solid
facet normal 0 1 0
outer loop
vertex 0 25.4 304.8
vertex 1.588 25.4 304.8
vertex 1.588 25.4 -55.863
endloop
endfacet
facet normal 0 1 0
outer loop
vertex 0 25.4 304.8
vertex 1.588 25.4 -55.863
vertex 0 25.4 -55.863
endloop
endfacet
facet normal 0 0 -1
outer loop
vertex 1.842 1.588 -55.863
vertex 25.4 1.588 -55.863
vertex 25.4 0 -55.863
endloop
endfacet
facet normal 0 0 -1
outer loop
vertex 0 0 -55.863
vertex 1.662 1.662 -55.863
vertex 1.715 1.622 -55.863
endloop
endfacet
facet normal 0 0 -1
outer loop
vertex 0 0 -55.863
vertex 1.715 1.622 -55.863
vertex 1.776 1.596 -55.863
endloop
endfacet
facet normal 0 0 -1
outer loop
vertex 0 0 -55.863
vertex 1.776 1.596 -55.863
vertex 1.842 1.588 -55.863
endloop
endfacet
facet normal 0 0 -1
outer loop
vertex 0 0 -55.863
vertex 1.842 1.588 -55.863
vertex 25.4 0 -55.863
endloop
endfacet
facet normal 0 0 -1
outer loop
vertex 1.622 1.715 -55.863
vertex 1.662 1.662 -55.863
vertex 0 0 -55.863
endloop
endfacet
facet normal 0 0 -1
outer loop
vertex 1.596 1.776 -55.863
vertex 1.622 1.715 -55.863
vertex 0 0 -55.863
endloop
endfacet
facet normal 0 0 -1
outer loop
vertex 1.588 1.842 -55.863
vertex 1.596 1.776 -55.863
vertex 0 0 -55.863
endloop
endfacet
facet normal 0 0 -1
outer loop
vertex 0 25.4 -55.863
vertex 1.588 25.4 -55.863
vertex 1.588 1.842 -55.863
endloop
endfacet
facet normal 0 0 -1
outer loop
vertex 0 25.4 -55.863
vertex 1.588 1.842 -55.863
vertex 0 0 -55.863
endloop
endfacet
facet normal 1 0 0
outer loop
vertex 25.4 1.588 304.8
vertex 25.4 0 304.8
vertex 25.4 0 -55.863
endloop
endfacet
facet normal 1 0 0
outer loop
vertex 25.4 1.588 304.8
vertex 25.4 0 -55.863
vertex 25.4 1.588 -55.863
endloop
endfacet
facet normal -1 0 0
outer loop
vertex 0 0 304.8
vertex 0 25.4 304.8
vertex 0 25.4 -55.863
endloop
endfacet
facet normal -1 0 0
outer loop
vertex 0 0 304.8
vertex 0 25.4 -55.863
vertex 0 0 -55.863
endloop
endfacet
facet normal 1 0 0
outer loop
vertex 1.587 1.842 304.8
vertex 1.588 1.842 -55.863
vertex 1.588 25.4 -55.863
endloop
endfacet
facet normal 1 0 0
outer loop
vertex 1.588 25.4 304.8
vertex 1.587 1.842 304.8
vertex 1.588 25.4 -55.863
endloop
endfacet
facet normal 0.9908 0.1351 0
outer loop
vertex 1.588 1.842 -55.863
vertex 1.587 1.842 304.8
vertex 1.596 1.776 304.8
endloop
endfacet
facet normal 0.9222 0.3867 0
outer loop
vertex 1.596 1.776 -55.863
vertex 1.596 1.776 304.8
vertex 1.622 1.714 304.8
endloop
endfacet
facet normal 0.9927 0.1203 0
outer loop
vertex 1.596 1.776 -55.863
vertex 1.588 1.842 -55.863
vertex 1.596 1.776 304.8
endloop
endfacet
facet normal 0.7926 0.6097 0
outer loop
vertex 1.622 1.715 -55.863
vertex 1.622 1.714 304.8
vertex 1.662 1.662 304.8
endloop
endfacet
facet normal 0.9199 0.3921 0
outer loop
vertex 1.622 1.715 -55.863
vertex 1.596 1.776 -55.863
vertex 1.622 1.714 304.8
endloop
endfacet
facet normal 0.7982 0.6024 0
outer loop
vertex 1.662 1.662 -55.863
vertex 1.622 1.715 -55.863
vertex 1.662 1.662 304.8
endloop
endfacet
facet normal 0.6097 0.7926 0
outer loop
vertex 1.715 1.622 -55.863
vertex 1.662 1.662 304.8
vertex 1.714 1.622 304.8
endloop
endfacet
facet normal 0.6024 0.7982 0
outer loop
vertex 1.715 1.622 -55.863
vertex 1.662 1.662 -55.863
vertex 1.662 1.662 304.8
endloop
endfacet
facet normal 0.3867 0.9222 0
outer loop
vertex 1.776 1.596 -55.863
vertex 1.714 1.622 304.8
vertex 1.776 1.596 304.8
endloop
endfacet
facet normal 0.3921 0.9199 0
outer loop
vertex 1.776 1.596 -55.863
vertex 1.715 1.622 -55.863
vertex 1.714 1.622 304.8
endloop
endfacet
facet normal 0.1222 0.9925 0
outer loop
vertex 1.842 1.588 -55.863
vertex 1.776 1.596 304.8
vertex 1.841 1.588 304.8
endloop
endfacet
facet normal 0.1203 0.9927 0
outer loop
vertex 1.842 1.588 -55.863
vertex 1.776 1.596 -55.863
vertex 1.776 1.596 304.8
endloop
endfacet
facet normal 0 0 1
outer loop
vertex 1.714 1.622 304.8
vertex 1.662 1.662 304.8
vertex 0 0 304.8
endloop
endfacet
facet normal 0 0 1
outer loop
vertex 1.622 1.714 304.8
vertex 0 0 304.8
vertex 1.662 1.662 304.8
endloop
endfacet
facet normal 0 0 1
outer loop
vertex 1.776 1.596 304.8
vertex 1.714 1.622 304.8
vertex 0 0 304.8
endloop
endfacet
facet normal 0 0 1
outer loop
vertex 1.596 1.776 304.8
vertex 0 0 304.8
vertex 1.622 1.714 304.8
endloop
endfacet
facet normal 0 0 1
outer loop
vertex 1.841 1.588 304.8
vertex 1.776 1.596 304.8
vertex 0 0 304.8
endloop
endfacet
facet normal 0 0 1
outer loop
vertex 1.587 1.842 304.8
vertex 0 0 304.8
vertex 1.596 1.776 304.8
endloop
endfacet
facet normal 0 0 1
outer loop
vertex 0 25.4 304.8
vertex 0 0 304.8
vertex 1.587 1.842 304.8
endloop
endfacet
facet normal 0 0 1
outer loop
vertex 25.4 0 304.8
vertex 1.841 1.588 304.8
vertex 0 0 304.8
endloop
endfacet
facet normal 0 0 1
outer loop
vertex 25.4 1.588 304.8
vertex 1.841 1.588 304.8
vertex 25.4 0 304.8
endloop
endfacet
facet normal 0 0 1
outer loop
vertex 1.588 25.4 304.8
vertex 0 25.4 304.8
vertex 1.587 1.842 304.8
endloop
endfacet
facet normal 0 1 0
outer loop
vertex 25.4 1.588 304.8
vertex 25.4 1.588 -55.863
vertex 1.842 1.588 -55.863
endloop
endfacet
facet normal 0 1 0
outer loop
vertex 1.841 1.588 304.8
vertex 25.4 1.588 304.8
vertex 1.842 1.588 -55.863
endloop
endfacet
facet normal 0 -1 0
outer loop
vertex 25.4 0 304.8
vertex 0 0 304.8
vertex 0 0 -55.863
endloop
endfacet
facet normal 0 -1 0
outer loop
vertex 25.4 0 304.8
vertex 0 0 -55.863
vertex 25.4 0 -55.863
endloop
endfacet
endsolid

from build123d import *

# Parameters (mm, degrees)
BOSS_EXTRUDE1_DEPTH = 304.8
FILLET1_R           = 0.254
CUT_EXTRUDE1_DEPTH  = 248.9375


with BuildPart() as part:
    # Sketch3 → Boss-Extrude1 (new, symmetric)
    with BuildSketch(Plane.XY):
        Polygon((1.5875, 25.4), (0, 25.4), (0, 0), (25.4, 0), (25.4, 1.5875), (1.5875, 1.5875), align=None)
    extrude(amount=BOSS_EXTRUDE1_DEPTH, both=True)

    # Fillet1
    fillet1_edges = [part.edges().sort_by_distance(p)[0] for p in [
        (1.5875, 1.5875, 0),
    ]]
    fillet(fillet1_edges, radius=FILLET1_R)

    # Sketch4 → Cut-Extrude1 (cut)
    with BuildSketch(Plane(origin=(0, 0, -304.8), x_dir=(-1, 0, 0), z_dir=(0, 0, -1))):
        with BuildLine():
            Line((-1.5875, 25.4), (-1.5875, 1.8415))
            ThreePointArc((-1.5875, 1.8415), (-1.661894878, 1.661894878), (-1.8415, 1.5875))
            Line((-1.8415, 1.5875), (-25.4, 1.5875))
            Line((-25.4, 1.5875), (-25.4, 0))
            Line((-25.4, 0), (0, 0))
            Line((0, 0), (0, 25.4))
            Line((0, 25.4), (-1.5875, 25.4))
        make_face()
    extrude(amount=-CUT_EXTRUDE1_DEPTH, mode=Mode.SUBTRACT)


solid = part.part
